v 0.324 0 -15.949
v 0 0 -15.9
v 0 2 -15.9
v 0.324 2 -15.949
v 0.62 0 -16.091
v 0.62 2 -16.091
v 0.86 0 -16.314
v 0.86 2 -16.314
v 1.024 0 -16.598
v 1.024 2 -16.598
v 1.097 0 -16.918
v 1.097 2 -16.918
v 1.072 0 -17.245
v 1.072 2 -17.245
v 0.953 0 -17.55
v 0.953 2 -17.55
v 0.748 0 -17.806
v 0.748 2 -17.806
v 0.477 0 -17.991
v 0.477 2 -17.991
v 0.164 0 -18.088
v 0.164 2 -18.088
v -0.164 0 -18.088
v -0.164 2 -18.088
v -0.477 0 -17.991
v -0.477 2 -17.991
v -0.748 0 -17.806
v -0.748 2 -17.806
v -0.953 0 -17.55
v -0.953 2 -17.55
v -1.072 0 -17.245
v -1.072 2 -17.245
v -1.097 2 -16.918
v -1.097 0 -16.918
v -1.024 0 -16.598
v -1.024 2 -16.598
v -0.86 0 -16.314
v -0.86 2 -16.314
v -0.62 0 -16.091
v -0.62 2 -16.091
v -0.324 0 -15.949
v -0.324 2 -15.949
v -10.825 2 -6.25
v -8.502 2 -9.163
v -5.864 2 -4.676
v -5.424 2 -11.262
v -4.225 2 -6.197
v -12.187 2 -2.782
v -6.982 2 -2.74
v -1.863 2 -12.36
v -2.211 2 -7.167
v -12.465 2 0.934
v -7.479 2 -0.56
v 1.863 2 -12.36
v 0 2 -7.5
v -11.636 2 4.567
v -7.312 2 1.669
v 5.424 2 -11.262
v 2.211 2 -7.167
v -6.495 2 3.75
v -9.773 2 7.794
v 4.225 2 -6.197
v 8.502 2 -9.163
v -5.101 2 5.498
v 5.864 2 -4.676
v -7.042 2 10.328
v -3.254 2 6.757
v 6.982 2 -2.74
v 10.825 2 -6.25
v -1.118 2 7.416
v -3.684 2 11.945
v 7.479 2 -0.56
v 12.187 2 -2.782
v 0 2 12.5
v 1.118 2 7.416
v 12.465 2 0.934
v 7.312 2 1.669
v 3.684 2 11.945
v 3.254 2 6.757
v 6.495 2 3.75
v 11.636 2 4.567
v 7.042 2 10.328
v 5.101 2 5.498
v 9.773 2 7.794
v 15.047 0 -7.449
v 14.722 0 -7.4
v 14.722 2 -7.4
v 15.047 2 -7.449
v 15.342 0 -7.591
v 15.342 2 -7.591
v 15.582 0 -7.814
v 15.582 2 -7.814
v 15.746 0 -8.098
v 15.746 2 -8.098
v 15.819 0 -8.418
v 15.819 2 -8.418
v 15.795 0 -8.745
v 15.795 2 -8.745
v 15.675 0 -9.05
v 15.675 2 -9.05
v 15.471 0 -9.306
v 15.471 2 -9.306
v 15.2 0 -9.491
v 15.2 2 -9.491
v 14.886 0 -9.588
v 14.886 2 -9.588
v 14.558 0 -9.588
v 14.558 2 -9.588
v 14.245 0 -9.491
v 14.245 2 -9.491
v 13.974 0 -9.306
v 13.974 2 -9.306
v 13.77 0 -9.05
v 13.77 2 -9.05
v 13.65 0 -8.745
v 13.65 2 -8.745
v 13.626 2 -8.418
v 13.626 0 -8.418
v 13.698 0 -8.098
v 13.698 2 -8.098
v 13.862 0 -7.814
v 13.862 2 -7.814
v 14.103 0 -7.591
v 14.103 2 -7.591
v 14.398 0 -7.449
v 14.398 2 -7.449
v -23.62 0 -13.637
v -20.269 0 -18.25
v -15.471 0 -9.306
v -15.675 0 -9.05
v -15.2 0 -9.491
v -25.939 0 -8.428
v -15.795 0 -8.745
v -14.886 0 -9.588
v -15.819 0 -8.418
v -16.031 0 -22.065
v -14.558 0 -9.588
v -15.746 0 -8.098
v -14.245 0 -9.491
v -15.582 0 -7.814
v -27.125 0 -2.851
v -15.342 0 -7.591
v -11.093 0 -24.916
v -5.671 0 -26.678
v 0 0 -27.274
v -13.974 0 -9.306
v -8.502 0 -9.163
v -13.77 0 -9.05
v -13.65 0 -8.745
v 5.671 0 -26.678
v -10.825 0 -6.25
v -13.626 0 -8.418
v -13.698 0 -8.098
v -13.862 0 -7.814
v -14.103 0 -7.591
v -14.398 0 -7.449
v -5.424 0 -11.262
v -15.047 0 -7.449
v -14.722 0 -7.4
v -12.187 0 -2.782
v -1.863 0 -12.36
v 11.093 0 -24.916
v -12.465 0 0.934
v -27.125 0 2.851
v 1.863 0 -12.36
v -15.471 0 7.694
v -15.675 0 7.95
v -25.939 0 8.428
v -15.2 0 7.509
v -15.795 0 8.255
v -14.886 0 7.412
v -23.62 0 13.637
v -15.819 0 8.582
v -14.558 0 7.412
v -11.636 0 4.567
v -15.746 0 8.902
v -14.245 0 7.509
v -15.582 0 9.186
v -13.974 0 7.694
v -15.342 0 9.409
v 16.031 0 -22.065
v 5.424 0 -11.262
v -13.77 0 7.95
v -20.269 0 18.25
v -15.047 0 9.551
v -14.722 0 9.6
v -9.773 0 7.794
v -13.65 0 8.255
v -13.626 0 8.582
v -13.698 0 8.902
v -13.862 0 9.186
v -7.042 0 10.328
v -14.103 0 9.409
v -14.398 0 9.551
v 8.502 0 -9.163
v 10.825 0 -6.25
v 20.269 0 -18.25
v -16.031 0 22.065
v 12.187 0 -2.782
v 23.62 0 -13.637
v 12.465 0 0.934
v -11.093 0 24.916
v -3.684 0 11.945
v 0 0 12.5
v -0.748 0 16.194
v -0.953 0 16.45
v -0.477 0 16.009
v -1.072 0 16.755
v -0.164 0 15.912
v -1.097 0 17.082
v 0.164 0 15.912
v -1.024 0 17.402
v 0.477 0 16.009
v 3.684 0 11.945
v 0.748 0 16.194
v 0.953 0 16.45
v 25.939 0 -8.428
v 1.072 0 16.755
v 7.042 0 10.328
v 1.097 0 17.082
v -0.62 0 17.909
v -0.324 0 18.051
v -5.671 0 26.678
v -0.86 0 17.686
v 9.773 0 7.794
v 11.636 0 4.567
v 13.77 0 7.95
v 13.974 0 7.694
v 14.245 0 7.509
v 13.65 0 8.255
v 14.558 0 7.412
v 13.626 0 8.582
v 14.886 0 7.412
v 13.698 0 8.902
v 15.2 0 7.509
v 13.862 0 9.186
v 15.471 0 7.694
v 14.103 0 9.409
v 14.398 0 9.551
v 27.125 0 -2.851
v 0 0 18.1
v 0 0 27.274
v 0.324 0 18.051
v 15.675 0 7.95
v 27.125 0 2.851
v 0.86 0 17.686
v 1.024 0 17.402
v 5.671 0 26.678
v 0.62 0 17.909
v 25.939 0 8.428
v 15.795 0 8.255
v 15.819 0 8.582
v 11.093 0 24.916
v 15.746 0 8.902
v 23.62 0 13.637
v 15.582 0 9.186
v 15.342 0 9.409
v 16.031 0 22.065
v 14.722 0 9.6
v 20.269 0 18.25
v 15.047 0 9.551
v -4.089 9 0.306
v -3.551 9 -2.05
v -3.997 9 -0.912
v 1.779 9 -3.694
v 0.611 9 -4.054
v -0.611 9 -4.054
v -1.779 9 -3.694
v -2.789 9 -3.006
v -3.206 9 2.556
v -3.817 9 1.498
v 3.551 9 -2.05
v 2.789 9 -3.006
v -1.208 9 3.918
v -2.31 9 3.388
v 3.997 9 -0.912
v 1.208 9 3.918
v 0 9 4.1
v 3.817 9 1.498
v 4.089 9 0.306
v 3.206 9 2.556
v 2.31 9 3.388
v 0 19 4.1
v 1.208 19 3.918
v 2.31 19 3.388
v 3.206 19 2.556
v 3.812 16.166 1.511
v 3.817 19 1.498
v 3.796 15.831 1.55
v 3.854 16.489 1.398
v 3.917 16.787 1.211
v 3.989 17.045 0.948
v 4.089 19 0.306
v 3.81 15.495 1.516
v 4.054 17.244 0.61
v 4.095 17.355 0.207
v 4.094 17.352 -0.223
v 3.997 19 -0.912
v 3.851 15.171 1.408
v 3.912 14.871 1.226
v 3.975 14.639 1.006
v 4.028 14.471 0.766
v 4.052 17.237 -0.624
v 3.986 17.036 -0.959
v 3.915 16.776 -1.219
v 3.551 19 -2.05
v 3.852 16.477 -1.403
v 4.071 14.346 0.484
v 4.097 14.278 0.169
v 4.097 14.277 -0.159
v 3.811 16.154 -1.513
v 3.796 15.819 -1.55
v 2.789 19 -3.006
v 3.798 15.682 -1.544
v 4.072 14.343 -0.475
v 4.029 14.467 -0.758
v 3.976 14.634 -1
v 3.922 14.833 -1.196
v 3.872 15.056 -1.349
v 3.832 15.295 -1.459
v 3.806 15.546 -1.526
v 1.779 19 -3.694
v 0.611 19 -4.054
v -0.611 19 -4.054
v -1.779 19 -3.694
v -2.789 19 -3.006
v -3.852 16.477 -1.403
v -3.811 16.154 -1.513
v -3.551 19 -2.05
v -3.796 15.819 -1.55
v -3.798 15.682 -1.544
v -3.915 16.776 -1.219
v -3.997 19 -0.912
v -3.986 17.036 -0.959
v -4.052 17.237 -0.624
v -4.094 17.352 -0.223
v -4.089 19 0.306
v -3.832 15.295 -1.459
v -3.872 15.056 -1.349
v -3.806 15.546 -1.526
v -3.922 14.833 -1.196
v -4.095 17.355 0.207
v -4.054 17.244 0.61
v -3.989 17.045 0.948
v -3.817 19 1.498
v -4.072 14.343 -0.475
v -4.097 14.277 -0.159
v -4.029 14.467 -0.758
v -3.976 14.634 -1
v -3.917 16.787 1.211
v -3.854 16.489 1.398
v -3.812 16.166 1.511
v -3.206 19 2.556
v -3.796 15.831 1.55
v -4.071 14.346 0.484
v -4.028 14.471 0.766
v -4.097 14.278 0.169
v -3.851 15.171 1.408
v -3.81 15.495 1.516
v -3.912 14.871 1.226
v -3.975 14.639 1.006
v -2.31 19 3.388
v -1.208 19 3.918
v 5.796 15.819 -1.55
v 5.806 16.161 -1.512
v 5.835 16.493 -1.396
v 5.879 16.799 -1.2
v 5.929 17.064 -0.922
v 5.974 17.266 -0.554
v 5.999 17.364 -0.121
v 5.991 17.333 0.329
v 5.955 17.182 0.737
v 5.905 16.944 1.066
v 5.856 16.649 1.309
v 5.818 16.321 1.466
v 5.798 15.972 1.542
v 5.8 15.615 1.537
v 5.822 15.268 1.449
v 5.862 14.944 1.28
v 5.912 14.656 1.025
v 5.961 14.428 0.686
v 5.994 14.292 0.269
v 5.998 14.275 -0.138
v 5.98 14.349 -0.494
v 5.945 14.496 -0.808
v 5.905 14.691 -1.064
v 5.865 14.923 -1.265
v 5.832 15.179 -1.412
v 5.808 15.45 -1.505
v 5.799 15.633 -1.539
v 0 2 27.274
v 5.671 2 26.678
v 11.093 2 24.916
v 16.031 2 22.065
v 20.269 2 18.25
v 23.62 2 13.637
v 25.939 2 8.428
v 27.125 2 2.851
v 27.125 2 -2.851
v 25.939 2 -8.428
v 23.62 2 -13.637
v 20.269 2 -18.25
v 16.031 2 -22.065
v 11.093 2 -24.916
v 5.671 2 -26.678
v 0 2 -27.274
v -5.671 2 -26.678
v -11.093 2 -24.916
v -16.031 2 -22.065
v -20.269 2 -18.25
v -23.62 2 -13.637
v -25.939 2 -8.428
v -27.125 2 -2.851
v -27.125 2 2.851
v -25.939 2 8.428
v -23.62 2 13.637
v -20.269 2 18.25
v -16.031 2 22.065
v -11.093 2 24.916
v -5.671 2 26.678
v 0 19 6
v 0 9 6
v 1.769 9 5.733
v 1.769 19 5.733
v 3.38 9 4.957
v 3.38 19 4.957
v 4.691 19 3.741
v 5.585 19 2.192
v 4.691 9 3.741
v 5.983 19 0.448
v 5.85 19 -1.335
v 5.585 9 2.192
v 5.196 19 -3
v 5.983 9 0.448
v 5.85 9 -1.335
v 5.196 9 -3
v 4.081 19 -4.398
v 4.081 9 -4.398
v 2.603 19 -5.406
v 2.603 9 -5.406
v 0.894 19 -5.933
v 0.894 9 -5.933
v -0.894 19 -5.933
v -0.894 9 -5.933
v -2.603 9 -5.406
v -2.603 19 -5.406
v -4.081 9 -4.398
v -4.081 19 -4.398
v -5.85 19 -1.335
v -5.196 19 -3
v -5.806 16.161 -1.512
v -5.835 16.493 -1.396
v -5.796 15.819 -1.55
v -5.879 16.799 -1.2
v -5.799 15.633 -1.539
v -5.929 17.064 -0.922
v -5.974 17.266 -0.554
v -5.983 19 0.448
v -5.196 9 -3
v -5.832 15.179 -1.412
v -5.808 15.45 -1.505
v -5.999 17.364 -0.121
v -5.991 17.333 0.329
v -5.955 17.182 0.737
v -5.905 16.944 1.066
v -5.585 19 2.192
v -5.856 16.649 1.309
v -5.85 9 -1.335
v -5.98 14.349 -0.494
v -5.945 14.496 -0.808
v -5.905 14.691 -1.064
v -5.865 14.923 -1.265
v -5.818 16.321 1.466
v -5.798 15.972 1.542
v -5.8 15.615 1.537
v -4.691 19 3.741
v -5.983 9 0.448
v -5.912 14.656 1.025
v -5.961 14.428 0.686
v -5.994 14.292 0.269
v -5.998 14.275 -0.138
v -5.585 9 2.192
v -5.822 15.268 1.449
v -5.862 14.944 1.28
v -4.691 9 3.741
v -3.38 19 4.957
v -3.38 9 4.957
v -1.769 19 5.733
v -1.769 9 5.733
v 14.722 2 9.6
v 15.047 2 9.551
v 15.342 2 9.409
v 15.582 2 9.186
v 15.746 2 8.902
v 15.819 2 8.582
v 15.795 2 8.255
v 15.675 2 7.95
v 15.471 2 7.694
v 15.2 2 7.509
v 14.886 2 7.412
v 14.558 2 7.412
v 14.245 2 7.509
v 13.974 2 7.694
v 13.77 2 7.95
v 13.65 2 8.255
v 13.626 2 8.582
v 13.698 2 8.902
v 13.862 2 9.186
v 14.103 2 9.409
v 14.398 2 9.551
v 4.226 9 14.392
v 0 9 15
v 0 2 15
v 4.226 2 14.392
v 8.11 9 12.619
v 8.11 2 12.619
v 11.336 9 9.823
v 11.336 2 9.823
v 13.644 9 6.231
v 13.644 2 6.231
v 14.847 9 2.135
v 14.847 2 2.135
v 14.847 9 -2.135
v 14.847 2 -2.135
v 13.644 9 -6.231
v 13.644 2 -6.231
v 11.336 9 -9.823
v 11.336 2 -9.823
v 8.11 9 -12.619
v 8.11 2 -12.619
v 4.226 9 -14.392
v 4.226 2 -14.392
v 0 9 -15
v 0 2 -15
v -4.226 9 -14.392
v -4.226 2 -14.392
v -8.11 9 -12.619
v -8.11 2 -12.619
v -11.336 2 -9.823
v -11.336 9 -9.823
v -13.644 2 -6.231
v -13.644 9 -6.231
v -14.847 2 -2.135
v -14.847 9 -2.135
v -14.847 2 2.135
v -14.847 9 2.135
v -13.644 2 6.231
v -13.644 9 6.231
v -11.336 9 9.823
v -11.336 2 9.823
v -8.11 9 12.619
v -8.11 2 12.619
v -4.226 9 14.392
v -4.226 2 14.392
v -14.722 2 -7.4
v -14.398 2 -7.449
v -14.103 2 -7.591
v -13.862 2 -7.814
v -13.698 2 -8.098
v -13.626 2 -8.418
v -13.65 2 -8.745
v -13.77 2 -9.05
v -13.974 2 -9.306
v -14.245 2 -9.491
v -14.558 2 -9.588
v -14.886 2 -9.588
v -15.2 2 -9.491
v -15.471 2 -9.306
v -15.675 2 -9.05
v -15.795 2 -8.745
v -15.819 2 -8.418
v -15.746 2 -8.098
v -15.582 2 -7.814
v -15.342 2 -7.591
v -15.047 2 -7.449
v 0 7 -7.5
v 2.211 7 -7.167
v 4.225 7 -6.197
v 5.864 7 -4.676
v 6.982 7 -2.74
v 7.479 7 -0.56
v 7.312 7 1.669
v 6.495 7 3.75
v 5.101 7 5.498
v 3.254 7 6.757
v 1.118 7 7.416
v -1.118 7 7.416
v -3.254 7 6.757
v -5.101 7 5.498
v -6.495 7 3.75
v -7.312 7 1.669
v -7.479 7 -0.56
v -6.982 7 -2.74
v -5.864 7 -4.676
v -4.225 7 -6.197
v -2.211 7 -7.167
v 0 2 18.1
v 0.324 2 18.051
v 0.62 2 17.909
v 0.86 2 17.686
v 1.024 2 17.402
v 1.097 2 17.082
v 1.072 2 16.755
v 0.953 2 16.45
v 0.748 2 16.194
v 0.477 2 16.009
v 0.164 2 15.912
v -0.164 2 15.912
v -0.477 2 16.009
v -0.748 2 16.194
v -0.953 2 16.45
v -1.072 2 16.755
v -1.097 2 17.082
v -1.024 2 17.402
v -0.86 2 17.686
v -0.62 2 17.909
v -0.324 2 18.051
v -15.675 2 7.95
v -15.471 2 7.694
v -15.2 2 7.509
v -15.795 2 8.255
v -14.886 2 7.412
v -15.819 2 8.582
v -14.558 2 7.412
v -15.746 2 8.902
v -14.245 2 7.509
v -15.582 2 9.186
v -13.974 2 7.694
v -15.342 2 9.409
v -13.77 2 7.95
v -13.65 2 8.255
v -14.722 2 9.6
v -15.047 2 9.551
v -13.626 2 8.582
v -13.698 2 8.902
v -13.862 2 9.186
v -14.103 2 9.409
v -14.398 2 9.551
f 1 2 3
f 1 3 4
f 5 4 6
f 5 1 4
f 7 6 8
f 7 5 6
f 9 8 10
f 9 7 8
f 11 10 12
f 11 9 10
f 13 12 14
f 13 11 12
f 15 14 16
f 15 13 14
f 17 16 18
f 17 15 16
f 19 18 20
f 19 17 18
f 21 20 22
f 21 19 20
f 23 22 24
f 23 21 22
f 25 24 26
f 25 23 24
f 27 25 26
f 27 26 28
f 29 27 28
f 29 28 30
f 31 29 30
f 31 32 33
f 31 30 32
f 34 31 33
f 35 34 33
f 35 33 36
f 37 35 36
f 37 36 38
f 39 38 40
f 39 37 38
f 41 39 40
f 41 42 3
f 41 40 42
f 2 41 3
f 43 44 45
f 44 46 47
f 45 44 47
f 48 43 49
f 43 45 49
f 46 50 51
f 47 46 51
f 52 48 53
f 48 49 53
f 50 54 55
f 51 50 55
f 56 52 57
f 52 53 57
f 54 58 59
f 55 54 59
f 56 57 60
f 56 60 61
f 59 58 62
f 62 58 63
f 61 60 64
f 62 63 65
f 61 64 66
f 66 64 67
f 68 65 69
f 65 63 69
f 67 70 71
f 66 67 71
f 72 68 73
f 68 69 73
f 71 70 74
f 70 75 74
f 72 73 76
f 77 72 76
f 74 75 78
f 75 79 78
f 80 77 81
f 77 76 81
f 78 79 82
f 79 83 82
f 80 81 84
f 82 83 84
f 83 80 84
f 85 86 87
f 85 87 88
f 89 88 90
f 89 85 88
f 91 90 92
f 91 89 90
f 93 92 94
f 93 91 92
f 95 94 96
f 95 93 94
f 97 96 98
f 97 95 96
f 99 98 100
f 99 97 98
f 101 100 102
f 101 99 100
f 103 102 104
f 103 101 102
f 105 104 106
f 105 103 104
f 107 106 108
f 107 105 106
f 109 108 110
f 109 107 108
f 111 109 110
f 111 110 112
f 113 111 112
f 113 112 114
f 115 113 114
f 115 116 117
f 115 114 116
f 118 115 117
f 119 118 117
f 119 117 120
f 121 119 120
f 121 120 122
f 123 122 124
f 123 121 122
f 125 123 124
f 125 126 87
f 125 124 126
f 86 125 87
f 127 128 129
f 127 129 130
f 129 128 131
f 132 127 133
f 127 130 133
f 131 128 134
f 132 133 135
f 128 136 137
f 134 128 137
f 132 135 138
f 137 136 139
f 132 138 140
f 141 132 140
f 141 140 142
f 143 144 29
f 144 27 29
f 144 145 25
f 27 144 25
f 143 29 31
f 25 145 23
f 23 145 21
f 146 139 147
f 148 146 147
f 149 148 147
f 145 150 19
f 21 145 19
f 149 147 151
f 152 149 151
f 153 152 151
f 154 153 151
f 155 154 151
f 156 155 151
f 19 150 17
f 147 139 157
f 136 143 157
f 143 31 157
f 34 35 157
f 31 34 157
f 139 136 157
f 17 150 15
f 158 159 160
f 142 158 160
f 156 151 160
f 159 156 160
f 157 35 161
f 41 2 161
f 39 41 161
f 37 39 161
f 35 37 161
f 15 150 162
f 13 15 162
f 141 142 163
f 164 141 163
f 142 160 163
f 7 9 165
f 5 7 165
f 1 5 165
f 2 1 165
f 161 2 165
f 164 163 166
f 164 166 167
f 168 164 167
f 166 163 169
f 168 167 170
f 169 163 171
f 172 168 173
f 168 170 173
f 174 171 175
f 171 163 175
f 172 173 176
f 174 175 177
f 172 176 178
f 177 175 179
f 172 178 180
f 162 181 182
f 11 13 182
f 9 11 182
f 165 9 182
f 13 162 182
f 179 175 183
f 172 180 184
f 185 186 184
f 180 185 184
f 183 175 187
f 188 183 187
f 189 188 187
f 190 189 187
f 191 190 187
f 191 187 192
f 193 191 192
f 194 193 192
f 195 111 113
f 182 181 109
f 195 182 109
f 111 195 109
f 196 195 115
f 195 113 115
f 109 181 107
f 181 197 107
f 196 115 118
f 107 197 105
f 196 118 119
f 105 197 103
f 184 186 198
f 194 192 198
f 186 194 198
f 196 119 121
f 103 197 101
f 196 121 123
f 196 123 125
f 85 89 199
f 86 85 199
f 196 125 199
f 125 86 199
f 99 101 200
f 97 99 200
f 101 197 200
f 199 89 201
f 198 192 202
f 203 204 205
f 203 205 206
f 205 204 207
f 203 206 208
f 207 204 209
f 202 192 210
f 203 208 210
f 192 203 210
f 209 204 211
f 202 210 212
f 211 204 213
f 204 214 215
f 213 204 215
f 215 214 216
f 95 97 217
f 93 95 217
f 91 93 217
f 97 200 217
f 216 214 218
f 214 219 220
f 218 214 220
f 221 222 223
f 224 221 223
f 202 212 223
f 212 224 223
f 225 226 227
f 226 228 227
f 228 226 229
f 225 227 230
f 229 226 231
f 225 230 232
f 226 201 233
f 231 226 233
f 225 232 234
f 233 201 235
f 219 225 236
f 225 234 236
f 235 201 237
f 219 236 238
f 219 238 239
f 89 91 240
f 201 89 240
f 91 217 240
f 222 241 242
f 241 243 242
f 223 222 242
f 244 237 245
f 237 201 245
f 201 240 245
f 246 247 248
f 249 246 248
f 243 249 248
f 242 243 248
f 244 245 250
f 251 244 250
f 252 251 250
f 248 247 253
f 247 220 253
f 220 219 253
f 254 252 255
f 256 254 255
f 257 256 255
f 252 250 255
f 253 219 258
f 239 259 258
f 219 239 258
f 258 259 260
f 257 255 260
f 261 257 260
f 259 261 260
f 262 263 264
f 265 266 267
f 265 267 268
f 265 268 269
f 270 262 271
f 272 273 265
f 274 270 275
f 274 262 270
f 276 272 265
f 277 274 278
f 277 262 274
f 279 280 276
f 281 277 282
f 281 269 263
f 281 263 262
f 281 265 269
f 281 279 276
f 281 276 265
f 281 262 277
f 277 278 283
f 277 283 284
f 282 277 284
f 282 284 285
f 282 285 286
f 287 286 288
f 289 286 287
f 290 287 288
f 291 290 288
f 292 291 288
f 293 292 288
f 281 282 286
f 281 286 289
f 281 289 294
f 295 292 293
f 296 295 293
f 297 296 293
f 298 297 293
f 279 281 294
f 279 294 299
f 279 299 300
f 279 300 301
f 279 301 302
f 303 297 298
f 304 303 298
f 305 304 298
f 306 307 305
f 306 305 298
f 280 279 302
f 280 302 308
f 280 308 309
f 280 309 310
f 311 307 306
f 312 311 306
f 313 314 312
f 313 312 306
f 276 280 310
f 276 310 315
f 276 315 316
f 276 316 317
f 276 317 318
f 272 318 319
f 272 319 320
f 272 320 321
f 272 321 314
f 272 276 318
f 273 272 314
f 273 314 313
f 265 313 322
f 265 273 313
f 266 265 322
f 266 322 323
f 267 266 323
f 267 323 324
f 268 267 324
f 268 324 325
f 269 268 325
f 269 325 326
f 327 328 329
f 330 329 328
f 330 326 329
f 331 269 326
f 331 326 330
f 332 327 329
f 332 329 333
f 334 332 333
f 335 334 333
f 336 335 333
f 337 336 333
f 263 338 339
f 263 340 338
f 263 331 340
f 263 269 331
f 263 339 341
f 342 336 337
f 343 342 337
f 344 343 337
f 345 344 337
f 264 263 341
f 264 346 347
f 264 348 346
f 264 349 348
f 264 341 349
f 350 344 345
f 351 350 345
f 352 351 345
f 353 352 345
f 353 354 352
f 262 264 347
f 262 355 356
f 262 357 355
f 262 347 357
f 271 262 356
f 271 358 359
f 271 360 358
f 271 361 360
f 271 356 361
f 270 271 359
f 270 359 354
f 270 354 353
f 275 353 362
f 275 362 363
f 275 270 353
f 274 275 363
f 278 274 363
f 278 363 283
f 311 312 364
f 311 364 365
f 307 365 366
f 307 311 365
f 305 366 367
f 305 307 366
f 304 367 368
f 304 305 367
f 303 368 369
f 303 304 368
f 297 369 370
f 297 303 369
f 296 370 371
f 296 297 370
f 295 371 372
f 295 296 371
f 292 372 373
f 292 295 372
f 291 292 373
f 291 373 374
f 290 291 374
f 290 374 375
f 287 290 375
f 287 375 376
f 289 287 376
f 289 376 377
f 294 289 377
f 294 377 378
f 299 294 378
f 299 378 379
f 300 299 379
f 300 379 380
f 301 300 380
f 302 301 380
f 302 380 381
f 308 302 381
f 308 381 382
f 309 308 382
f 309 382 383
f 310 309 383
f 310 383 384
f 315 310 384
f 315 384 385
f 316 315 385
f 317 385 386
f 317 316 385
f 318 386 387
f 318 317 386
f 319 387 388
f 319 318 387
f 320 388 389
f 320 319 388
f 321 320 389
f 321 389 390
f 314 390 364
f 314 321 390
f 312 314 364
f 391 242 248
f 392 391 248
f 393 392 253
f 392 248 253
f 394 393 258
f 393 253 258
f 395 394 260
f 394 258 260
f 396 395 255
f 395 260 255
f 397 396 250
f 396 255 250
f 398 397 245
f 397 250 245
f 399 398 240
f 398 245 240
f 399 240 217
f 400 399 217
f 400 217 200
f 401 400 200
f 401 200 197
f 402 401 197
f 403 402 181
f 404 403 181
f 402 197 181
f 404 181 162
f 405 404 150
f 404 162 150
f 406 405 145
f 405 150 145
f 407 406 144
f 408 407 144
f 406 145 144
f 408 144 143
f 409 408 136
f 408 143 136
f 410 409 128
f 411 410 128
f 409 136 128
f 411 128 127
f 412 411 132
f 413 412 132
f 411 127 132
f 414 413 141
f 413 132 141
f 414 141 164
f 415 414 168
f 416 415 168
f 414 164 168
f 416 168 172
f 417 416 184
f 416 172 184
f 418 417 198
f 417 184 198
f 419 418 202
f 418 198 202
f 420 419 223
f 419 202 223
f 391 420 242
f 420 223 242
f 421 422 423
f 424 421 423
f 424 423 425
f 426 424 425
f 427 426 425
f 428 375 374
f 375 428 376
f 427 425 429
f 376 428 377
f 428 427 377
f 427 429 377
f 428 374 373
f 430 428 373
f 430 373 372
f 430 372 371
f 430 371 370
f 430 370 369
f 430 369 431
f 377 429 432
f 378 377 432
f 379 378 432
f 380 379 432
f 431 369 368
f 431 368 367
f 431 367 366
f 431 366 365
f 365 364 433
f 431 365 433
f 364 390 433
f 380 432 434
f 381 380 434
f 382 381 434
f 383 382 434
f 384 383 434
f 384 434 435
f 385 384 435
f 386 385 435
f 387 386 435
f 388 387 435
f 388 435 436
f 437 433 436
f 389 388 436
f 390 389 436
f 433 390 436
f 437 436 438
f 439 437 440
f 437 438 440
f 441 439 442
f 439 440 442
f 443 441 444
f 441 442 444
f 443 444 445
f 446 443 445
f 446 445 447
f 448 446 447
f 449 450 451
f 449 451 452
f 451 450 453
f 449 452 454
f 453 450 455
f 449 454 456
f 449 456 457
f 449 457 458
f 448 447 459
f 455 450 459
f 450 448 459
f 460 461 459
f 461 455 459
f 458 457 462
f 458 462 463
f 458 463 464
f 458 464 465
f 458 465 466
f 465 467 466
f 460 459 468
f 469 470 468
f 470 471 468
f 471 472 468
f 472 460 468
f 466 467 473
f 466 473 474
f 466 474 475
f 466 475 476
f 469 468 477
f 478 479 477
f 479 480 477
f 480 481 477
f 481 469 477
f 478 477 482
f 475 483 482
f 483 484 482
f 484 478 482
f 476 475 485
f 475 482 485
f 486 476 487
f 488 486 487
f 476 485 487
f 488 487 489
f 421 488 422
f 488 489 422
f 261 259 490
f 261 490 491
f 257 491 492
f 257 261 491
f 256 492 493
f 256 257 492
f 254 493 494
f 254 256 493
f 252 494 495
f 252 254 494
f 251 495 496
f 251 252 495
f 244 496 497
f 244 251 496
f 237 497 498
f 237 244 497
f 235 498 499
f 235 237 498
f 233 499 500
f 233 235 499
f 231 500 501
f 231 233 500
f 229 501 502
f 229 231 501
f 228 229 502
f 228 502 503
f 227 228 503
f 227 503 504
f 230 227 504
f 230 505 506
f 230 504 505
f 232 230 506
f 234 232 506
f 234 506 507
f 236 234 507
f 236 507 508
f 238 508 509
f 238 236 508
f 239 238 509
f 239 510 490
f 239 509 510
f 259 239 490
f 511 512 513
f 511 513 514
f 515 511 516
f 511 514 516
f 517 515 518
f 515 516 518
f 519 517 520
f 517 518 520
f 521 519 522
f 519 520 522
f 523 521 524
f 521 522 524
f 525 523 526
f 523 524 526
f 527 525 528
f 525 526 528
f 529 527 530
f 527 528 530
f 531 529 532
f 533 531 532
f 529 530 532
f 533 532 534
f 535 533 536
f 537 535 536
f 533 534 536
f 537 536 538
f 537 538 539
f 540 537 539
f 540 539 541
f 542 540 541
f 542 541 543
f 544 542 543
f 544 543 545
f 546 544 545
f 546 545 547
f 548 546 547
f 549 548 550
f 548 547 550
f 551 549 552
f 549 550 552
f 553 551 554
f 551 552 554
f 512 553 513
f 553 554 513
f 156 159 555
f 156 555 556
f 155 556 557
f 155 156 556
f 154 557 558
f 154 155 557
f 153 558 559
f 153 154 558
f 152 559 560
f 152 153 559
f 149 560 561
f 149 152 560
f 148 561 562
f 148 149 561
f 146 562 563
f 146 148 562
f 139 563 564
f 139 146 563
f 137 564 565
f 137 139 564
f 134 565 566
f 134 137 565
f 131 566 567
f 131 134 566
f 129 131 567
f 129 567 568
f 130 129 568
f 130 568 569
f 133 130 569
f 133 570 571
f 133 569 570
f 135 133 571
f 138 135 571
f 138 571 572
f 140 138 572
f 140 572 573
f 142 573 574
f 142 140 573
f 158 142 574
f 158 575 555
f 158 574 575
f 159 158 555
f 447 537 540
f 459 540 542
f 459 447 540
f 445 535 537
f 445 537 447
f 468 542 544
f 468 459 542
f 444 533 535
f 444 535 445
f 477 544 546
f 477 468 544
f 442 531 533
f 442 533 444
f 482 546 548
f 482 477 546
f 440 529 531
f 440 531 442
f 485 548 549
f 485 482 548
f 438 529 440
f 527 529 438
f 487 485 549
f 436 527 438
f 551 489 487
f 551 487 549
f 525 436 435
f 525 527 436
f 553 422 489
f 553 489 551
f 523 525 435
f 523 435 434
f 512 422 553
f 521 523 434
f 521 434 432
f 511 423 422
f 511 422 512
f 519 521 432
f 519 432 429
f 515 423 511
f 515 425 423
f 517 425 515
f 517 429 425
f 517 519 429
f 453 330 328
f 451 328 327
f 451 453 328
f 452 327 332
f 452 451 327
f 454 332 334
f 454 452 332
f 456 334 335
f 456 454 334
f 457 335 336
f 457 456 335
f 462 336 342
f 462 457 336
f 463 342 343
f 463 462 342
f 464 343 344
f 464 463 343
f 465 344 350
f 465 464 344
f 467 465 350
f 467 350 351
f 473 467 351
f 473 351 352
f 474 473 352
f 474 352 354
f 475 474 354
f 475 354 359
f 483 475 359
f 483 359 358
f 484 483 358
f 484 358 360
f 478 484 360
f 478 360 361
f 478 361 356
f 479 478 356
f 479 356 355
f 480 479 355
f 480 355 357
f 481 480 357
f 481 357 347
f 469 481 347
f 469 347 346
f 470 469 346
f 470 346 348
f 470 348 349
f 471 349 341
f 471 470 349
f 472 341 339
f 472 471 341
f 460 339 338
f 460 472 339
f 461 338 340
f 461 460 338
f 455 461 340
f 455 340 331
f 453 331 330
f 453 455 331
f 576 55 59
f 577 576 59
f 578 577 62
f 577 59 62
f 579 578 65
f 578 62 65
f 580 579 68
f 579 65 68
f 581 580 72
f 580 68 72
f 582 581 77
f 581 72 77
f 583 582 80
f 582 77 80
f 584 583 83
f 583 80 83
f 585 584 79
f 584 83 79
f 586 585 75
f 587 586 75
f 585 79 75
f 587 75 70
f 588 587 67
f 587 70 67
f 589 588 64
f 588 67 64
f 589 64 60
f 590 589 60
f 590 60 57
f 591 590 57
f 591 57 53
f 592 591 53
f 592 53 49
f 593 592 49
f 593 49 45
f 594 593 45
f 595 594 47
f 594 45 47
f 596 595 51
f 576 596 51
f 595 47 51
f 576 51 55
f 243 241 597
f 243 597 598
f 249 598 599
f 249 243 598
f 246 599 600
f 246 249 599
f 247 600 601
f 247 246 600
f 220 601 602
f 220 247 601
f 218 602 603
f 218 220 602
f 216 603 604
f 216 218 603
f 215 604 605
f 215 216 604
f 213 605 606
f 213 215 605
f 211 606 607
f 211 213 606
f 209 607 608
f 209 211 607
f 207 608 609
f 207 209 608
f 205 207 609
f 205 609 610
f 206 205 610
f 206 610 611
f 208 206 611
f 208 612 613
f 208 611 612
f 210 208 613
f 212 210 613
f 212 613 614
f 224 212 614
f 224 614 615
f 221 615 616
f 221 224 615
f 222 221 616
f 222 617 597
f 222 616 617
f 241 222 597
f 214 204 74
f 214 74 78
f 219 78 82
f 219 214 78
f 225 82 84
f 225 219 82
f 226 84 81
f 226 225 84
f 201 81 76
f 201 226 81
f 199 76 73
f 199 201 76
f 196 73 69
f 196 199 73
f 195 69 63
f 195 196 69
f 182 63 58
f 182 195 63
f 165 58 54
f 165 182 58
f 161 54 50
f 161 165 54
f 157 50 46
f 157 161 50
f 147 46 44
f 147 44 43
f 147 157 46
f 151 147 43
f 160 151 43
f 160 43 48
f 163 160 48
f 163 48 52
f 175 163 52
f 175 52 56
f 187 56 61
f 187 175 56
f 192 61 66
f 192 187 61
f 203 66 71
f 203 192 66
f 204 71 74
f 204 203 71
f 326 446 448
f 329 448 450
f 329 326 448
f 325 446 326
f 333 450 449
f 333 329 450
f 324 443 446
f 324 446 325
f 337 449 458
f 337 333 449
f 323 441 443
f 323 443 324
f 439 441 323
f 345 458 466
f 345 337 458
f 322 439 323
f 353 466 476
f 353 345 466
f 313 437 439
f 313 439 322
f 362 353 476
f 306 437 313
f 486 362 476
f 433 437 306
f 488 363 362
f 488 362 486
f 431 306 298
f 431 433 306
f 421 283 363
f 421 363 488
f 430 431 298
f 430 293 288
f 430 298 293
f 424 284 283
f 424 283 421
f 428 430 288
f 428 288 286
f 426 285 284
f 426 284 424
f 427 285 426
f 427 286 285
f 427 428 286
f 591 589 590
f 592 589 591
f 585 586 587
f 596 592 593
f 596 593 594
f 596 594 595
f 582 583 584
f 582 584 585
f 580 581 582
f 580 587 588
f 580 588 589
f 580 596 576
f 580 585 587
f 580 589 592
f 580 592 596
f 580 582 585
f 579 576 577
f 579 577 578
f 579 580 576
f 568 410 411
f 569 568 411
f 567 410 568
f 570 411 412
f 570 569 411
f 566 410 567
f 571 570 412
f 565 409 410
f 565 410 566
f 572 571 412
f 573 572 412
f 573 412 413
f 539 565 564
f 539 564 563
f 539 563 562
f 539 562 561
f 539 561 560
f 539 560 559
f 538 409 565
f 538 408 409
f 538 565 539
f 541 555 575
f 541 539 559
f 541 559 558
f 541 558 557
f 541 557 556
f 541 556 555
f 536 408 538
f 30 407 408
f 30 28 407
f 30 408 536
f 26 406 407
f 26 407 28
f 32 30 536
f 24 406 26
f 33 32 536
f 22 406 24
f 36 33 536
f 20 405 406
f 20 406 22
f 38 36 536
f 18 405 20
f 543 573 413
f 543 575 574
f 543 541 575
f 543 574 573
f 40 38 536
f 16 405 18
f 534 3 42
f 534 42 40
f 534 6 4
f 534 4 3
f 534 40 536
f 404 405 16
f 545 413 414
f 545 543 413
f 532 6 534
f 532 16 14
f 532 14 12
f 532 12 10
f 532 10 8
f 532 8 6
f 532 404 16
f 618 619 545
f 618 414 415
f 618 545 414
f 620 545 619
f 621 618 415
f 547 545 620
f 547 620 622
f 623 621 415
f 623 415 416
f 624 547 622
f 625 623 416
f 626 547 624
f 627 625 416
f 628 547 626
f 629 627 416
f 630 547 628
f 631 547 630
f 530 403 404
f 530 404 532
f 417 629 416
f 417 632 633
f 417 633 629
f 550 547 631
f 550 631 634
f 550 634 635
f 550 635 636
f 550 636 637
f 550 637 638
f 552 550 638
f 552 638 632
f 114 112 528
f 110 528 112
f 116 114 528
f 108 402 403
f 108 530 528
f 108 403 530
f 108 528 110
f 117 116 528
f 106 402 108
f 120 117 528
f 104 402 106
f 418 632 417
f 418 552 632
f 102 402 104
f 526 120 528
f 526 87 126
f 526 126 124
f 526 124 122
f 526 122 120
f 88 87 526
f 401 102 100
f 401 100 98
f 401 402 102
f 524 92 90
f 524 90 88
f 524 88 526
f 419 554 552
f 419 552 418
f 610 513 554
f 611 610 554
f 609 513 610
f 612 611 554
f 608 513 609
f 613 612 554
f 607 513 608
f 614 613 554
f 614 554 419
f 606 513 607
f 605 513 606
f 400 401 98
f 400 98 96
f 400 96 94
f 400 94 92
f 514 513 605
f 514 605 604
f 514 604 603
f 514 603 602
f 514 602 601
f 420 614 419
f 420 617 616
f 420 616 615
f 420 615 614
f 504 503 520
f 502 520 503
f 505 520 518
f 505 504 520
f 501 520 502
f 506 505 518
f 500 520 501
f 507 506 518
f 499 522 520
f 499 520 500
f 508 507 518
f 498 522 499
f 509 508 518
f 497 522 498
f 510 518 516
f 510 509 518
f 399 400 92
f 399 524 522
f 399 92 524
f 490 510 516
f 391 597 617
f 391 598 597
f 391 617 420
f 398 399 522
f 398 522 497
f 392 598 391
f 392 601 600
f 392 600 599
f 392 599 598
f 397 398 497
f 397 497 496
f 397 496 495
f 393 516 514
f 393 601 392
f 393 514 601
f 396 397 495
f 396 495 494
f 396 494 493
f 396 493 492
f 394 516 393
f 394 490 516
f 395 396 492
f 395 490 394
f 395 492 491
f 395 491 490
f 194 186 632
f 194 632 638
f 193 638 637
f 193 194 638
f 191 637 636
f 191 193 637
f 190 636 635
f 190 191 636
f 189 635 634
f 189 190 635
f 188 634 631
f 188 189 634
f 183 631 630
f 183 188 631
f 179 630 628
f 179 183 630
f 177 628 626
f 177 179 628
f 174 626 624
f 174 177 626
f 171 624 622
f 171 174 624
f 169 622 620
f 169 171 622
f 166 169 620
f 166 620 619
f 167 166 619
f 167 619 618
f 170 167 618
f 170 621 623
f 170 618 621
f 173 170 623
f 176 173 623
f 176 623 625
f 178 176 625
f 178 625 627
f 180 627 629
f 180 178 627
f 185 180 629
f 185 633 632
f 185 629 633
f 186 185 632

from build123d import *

# Parameters (mm, degrees)
SKETCH1_R               = 27.274244274
SKETCH1_R_2             = 12.5
BOSS_EXTRUDE1_DEPTH     = 2
SKETCH4_R               = 15
BOSS_EXTRUDE3_DEPTH     = 7
SKETCH5_R               = 6
SKETCH5_R_2             = 4.1
BOSS_EXTRUDE4_DEPTH     = 10
CUT_EXTRUDE1_DEPTH      = 43.997311561
CUT_EXTRUDE1_DEPTH_BACK = 43.997311561
SKETCH6_R               = 1.55
SKETCH7_R               = 7.5
CUT_EXTRUDE2_DEPTH      = 5
CUT_EXTRUDE3_DEPTH      = 43.151735491
CUT_EXTRUDE3_DEPTH_BACK = 43.151735491
SKETCH9_R               = 1.1


with BuildPart() as part:
    # Sketch1 → Boss-Extrude1 (new body)
    with BuildSketch(Plane(origin=(0, 0, 0), x_dir=(1, 0, 0), z_dir=(0, 1, 0))):
        with Locations(Location((0, 0, 0), (0, 0, 270))):
            Circle(SKETCH1_R)
        with Locations(Location((0, 0, 0), (0, 0, 270))):
            Circle(SKETCH1_R_2, mode=Mode.SUBTRACT)
    extrude(amount=BOSS_EXTRUDE1_DEPTH)

    # Sketch4 → Boss-Extrude3 (add)
    with BuildSketch(Plane(origin=(0, 2, 0), x_dir=(1, 0, 0), z_dir=(0, 1, 0))):
        with Locations(Location((0, 0, 0), (0, 0, 270))):
            Circle(SKETCH4_R)
    extrude(amount=BOSS_EXTRUDE3_DEPTH)

    # Sketch5 → Boss-Extrude4 (add)
    with BuildSketch(Plane(origin=(0, 9, 0), x_dir=(1, 0, 0), z_dir=(0, 1, 0))):
        with Locations(Location((0, 0, 0), (0, 0, 270))):
            Circle(SKETCH5_R)
        with Locations(Location((0, 0, 0), (0, 0, 270))):
            Circle(SKETCH5_R_2, mode=Mode.SUBTRACT)
    extrude(amount=BOSS_EXTRUDE4_DEPTH)

    # Sketch6 → Cut-Extrude1 (cut, two sides: drawn at the far end of the back side and taken through both)
    with BuildSketch(Plane(origin=(0, 0, 0), x_dir=(0, 0, -1), z_dir=(1, 0, 0)).offset(-CUT_EXTRUDE1_DEPTH_BACK)):
        with Locations((0, 15.818596456)):
            Circle(SKETCH6_R)
    extrude(amount=CUT_EXTRUDE1_DEPTH + CUT_EXTRUDE1_DEPTH_BACK, mode=Mode.SUBTRACT)

    # Sketch7 → Cut-Extrude2 (cut)
    with BuildSketch(Plane.XZ.offset(-2)):
        with Locations(Location((0, 0, 0), (0, 0, 270))):
            Circle(SKETCH7_R)
    extrude(amount=-CUT_EXTRUDE2_DEPTH, mode=Mode.SUBTRACT)

    # Sketch9 → Cut-Extrude3 (cut, two sides: drawn at the far end of the back side and taken through both)
    with BuildSketch(Plane(origin=(0, 2, 0), x_dir=(1, 0, 0), z_dir=(0, 1, 0)).offset(-CUT_EXTRUDE3_DEPTH_BACK)):
        with Locations(Location((0, 17, 0), (0, 0, 270))):
            Circle(SKETCH9_R)
        with Locations(Location((14.722431864, 8.5, 0), (0, 0, 270))):
            Circle(SKETCH9_R)
        with Locations(Location((14.722431864, -8.5, 0), (0, 0, 270))):
            Circle(SKETCH9_R)
        with Locations(Location((0, -17, 0), (0, 0, 270))):
            Circle(SKETCH9_R)
        with Locations(Location((-14.722431864, -8.5, 0), (0, 0, 270))):
            Circle(SKETCH9_R)
        with Locations(Location((-14.722431864, 8.5, 0), (0, 0, 270))):
            Circle(SKETCH9_R)
    extrude(amount=CUT_EXTRUDE3_DEPTH + CUT_EXTRUDE3_DEPTH_BACK, mode=Mode.SUBTRACT)


solid = part.part
